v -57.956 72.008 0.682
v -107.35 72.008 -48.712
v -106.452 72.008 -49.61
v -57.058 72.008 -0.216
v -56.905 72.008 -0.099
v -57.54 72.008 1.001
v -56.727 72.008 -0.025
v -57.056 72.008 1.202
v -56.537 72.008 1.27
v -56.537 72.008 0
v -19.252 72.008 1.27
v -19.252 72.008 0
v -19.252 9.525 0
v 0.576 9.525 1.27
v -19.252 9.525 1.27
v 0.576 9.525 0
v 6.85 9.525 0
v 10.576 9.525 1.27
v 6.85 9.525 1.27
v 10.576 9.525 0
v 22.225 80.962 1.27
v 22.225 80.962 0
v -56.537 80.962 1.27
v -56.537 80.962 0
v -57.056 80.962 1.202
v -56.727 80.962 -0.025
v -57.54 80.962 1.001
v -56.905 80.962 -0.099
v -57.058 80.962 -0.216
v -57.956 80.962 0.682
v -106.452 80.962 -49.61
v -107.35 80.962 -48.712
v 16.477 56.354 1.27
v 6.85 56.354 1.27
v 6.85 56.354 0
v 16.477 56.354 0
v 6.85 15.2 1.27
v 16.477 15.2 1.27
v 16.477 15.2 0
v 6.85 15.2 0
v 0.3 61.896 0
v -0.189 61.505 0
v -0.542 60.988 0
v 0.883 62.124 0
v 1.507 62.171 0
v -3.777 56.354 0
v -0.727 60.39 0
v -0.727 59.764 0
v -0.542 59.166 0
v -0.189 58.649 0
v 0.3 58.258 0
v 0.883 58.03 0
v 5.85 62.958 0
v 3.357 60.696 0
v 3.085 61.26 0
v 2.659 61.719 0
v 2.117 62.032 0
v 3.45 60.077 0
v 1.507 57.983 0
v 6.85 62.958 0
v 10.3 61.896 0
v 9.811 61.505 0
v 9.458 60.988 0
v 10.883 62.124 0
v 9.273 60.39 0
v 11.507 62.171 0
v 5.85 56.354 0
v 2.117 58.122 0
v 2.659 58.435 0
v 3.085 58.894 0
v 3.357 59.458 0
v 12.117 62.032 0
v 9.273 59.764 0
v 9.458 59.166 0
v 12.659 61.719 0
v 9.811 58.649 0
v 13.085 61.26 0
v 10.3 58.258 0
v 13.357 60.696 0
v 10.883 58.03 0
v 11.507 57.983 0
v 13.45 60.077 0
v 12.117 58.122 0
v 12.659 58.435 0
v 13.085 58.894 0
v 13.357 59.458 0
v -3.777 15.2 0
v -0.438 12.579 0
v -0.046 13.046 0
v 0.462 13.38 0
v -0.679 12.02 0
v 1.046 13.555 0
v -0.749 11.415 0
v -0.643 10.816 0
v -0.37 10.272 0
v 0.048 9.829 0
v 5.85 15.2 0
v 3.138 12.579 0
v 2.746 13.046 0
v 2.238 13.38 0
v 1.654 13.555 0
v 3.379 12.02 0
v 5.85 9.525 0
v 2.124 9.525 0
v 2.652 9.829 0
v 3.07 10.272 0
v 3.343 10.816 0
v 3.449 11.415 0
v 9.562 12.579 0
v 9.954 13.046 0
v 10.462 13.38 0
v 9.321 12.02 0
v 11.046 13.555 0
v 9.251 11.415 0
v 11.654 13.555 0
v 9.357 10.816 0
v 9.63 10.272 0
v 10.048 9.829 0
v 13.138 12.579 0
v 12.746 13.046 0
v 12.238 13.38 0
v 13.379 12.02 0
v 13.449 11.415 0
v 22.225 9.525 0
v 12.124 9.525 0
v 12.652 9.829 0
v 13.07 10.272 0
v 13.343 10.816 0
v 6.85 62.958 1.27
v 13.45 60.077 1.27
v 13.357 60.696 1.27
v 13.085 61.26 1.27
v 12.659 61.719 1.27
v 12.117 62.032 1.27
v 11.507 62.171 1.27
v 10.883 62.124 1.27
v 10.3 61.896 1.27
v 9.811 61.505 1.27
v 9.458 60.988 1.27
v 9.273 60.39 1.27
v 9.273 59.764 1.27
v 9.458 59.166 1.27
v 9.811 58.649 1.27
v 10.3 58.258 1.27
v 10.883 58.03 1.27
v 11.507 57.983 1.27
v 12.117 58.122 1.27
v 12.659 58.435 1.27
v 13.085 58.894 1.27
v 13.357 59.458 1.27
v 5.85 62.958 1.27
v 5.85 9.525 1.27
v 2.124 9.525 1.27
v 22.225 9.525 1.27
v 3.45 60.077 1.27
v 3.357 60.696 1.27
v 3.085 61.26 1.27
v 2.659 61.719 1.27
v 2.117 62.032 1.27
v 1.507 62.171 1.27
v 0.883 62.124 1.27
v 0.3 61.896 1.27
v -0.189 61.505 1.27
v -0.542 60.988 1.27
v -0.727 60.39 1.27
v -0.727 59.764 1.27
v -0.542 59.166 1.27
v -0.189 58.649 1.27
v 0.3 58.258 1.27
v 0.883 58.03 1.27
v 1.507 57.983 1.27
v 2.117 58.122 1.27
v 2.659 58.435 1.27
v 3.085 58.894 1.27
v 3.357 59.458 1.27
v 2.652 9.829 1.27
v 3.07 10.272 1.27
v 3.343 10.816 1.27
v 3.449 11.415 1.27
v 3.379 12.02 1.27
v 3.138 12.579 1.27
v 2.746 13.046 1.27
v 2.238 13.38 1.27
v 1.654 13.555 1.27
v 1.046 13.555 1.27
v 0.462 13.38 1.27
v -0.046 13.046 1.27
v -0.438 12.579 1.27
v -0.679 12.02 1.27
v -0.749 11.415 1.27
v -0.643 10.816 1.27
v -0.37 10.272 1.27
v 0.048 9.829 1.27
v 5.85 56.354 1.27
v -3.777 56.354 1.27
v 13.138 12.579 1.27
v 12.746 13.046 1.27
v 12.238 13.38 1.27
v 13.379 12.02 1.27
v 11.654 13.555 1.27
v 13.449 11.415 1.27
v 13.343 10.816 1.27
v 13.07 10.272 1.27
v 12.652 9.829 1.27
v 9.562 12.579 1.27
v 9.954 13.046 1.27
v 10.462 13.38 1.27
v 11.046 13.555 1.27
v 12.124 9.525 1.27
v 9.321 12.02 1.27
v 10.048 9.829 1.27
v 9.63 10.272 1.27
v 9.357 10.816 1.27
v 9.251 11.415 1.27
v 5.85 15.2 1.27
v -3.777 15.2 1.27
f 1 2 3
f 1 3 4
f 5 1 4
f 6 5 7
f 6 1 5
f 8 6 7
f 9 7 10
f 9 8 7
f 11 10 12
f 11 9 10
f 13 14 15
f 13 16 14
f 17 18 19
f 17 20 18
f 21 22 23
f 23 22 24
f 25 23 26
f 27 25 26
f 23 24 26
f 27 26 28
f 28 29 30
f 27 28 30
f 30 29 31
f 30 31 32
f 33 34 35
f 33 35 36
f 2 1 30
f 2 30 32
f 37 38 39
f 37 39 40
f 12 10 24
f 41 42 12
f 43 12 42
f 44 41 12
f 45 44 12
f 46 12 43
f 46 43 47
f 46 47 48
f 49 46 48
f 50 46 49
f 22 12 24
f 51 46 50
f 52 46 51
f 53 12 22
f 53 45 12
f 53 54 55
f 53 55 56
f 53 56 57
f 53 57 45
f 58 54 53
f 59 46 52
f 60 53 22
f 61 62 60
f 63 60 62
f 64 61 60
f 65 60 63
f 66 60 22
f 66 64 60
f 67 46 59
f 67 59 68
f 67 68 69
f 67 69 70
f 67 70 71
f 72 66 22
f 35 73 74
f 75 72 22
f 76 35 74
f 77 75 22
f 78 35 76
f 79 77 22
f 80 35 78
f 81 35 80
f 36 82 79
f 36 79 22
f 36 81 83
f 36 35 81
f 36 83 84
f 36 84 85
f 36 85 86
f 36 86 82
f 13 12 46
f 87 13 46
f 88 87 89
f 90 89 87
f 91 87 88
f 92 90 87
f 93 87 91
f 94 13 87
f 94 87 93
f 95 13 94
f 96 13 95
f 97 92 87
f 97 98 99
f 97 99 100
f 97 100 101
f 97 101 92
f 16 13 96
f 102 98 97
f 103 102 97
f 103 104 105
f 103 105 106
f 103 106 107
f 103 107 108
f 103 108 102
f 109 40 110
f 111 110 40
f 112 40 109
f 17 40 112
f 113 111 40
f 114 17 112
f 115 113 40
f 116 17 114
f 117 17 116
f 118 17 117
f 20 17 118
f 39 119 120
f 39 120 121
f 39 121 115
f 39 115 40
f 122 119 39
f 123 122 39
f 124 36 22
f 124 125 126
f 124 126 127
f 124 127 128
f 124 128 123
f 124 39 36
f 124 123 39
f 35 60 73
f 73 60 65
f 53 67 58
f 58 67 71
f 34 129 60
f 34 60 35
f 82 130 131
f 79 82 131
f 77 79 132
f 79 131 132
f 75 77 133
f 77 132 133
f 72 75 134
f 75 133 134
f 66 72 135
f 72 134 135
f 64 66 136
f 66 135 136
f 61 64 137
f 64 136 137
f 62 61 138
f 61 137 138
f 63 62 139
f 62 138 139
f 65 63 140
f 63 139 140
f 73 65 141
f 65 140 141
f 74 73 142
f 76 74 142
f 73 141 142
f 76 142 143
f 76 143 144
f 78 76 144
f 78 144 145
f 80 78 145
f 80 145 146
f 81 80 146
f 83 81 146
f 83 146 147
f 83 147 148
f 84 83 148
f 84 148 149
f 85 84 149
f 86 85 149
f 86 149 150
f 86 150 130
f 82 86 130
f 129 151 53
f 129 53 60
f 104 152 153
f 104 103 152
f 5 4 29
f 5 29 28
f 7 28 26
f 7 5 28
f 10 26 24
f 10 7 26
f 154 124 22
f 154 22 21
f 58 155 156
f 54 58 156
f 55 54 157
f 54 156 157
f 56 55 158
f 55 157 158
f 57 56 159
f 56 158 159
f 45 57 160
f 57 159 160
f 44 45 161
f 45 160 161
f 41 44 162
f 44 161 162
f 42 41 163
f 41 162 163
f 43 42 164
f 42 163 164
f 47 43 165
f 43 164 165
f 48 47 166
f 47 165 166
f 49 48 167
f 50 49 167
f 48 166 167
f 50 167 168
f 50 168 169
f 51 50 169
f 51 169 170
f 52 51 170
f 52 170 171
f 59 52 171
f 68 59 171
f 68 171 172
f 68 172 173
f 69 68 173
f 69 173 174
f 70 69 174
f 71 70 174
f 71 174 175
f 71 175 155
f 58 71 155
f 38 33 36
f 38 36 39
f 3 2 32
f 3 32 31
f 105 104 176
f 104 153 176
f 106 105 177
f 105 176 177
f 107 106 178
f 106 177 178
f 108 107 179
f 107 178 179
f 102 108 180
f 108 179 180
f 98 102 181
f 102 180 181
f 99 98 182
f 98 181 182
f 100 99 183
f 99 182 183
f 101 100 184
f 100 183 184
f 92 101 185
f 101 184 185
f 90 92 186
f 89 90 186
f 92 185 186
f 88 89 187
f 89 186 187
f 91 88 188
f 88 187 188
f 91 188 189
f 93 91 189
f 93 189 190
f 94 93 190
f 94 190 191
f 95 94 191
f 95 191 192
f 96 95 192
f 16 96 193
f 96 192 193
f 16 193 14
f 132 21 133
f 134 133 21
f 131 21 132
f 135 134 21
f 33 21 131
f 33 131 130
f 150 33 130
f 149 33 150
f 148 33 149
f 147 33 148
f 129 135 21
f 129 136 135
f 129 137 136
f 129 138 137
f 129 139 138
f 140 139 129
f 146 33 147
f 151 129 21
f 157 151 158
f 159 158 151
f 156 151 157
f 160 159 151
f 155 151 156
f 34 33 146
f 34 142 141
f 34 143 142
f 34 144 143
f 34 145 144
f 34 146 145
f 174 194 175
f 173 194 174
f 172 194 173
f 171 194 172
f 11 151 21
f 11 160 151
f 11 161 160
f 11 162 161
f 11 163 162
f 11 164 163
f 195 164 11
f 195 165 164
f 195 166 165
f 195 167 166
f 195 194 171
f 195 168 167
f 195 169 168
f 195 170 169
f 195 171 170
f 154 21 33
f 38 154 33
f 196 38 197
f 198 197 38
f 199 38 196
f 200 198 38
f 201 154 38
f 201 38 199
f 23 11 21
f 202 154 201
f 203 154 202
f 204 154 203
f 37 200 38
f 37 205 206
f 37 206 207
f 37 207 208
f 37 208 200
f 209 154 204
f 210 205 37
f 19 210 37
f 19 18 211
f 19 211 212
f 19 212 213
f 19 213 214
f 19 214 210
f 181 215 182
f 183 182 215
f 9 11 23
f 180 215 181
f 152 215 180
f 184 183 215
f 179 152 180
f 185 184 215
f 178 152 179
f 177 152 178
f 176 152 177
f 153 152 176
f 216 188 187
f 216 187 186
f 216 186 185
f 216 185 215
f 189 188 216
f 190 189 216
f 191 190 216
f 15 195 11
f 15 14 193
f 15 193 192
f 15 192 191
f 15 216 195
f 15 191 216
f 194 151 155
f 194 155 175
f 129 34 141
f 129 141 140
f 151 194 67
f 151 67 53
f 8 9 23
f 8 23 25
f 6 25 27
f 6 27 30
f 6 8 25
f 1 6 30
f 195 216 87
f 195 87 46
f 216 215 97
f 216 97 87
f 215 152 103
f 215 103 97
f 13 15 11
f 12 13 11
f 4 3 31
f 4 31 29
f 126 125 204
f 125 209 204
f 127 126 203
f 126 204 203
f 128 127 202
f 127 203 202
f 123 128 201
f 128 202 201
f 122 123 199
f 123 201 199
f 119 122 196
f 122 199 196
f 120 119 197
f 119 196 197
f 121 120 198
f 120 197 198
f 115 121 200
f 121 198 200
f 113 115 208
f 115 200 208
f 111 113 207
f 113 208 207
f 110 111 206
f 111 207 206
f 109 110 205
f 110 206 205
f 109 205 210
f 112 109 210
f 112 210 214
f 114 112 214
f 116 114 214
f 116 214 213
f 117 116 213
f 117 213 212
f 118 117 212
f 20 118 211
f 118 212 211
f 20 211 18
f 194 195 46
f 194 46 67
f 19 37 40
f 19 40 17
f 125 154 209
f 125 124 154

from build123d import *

# Parameters (mm, degrees)
BASE_FLANGE1_DEPTH      = 9.525
BASE_FLANGE1_DEPTH_BACK = 61.9125
SKETCH9_W               = 88.097631615
SKETCH9_H               = 62.483000002
CUT_EXTRUDE1_DEPTH      = 144.762808626
SKETCH12_R              = 2.099999991
CUT_EXTRUDE2_DEPTH      = 144.762808626


# Sheet-metal steps are written as plain solids
with BuildPart() as part:
    # Sketch2 → Base-Flange1 (new, two sides: drawn at the far end of the back side and taken through both)
    with BuildSketch(Plane(origin=(0, 71.4375, 0), x_dir=(1, 0, 0), z_dir=(0, 1, 0)).offset(-BASE_FLANGE1_DEPTH_BACK)):
        with BuildLine():
            Line((-106.452002215, 49.610155888), (-57.057591472, 0.215745145))
            ThreePointArc((-57.057591472, 0.215745145), (-56.818621234, 0.056070336), (-56.536736617, 0))
            Line((-56.536736617, 0), (22.225, 0))
            Line((22.225, 0), (22.225, -1.27))
            Line((22.225, -1.27), (-56.536736617, -1.27))
            ThreePointArc((-56.536736617, -1.27), (-57.304629193, -1.11725667), (-57.955617084, -0.682280467))
            Line((-57.955617084, -0.682280467), (-107.350027828, 48.712130276))
            Line((-107.350027828, 48.712130276), (-106.452002215, 49.610155888))
        make_face()
    extrude(amount=BASE_FLANGE1_DEPTH + BASE_FLANGE1_DEPTH_BACK)

    # Sketch9 → Cut-Extrude1 (cut, through all)
    with BuildSketch(Plane.XY.offset(1.27)):
        with Locations((-63.301212021, 40.766500001)):
            Rectangle(SKETCH9_W, SKETCH9_H)
    extrude(amount=-CUT_EXTRUDE1_DEPTH, mode=Mode.SUBTRACT)

    # Sketch12 → Cut-Extrude2 (cut, through all)
    with BuildSketch(Plane.XY.offset(1.27)):
        with Locations((11.350000033, 11.477000033)):
            Circle(SKETCH12_R)
        with Locations((1.349999967, 11.477000033)):
            Circle(SKETCH12_R)
        with Locations((11.350000033, 60.077000115)):
            Circle(SKETCH12_R)
        with Locations((1.349999967, 60.077000115)):
            Circle(SKETCH12_R)
        Polygon((6.85, 8.59600008), (5.85, 8.59600008), (5.85, 15.20000008), (-3.776999939, 15.20000008), (-3.776999939, 56.354000068), (5.85, 56.354000068), (5.85, 62.958000068), (6.85, 62.958000068), (6.85, 56.354000068), (16.476999939, 56.354000068), (16.476999939, 15.20000008), (6.85, 15.20000008), align=None)
    extrude(amount=-CUT_EXTRUDE2_DEPTH, mode=Mode.SUBTRACT)


solid = part.part
